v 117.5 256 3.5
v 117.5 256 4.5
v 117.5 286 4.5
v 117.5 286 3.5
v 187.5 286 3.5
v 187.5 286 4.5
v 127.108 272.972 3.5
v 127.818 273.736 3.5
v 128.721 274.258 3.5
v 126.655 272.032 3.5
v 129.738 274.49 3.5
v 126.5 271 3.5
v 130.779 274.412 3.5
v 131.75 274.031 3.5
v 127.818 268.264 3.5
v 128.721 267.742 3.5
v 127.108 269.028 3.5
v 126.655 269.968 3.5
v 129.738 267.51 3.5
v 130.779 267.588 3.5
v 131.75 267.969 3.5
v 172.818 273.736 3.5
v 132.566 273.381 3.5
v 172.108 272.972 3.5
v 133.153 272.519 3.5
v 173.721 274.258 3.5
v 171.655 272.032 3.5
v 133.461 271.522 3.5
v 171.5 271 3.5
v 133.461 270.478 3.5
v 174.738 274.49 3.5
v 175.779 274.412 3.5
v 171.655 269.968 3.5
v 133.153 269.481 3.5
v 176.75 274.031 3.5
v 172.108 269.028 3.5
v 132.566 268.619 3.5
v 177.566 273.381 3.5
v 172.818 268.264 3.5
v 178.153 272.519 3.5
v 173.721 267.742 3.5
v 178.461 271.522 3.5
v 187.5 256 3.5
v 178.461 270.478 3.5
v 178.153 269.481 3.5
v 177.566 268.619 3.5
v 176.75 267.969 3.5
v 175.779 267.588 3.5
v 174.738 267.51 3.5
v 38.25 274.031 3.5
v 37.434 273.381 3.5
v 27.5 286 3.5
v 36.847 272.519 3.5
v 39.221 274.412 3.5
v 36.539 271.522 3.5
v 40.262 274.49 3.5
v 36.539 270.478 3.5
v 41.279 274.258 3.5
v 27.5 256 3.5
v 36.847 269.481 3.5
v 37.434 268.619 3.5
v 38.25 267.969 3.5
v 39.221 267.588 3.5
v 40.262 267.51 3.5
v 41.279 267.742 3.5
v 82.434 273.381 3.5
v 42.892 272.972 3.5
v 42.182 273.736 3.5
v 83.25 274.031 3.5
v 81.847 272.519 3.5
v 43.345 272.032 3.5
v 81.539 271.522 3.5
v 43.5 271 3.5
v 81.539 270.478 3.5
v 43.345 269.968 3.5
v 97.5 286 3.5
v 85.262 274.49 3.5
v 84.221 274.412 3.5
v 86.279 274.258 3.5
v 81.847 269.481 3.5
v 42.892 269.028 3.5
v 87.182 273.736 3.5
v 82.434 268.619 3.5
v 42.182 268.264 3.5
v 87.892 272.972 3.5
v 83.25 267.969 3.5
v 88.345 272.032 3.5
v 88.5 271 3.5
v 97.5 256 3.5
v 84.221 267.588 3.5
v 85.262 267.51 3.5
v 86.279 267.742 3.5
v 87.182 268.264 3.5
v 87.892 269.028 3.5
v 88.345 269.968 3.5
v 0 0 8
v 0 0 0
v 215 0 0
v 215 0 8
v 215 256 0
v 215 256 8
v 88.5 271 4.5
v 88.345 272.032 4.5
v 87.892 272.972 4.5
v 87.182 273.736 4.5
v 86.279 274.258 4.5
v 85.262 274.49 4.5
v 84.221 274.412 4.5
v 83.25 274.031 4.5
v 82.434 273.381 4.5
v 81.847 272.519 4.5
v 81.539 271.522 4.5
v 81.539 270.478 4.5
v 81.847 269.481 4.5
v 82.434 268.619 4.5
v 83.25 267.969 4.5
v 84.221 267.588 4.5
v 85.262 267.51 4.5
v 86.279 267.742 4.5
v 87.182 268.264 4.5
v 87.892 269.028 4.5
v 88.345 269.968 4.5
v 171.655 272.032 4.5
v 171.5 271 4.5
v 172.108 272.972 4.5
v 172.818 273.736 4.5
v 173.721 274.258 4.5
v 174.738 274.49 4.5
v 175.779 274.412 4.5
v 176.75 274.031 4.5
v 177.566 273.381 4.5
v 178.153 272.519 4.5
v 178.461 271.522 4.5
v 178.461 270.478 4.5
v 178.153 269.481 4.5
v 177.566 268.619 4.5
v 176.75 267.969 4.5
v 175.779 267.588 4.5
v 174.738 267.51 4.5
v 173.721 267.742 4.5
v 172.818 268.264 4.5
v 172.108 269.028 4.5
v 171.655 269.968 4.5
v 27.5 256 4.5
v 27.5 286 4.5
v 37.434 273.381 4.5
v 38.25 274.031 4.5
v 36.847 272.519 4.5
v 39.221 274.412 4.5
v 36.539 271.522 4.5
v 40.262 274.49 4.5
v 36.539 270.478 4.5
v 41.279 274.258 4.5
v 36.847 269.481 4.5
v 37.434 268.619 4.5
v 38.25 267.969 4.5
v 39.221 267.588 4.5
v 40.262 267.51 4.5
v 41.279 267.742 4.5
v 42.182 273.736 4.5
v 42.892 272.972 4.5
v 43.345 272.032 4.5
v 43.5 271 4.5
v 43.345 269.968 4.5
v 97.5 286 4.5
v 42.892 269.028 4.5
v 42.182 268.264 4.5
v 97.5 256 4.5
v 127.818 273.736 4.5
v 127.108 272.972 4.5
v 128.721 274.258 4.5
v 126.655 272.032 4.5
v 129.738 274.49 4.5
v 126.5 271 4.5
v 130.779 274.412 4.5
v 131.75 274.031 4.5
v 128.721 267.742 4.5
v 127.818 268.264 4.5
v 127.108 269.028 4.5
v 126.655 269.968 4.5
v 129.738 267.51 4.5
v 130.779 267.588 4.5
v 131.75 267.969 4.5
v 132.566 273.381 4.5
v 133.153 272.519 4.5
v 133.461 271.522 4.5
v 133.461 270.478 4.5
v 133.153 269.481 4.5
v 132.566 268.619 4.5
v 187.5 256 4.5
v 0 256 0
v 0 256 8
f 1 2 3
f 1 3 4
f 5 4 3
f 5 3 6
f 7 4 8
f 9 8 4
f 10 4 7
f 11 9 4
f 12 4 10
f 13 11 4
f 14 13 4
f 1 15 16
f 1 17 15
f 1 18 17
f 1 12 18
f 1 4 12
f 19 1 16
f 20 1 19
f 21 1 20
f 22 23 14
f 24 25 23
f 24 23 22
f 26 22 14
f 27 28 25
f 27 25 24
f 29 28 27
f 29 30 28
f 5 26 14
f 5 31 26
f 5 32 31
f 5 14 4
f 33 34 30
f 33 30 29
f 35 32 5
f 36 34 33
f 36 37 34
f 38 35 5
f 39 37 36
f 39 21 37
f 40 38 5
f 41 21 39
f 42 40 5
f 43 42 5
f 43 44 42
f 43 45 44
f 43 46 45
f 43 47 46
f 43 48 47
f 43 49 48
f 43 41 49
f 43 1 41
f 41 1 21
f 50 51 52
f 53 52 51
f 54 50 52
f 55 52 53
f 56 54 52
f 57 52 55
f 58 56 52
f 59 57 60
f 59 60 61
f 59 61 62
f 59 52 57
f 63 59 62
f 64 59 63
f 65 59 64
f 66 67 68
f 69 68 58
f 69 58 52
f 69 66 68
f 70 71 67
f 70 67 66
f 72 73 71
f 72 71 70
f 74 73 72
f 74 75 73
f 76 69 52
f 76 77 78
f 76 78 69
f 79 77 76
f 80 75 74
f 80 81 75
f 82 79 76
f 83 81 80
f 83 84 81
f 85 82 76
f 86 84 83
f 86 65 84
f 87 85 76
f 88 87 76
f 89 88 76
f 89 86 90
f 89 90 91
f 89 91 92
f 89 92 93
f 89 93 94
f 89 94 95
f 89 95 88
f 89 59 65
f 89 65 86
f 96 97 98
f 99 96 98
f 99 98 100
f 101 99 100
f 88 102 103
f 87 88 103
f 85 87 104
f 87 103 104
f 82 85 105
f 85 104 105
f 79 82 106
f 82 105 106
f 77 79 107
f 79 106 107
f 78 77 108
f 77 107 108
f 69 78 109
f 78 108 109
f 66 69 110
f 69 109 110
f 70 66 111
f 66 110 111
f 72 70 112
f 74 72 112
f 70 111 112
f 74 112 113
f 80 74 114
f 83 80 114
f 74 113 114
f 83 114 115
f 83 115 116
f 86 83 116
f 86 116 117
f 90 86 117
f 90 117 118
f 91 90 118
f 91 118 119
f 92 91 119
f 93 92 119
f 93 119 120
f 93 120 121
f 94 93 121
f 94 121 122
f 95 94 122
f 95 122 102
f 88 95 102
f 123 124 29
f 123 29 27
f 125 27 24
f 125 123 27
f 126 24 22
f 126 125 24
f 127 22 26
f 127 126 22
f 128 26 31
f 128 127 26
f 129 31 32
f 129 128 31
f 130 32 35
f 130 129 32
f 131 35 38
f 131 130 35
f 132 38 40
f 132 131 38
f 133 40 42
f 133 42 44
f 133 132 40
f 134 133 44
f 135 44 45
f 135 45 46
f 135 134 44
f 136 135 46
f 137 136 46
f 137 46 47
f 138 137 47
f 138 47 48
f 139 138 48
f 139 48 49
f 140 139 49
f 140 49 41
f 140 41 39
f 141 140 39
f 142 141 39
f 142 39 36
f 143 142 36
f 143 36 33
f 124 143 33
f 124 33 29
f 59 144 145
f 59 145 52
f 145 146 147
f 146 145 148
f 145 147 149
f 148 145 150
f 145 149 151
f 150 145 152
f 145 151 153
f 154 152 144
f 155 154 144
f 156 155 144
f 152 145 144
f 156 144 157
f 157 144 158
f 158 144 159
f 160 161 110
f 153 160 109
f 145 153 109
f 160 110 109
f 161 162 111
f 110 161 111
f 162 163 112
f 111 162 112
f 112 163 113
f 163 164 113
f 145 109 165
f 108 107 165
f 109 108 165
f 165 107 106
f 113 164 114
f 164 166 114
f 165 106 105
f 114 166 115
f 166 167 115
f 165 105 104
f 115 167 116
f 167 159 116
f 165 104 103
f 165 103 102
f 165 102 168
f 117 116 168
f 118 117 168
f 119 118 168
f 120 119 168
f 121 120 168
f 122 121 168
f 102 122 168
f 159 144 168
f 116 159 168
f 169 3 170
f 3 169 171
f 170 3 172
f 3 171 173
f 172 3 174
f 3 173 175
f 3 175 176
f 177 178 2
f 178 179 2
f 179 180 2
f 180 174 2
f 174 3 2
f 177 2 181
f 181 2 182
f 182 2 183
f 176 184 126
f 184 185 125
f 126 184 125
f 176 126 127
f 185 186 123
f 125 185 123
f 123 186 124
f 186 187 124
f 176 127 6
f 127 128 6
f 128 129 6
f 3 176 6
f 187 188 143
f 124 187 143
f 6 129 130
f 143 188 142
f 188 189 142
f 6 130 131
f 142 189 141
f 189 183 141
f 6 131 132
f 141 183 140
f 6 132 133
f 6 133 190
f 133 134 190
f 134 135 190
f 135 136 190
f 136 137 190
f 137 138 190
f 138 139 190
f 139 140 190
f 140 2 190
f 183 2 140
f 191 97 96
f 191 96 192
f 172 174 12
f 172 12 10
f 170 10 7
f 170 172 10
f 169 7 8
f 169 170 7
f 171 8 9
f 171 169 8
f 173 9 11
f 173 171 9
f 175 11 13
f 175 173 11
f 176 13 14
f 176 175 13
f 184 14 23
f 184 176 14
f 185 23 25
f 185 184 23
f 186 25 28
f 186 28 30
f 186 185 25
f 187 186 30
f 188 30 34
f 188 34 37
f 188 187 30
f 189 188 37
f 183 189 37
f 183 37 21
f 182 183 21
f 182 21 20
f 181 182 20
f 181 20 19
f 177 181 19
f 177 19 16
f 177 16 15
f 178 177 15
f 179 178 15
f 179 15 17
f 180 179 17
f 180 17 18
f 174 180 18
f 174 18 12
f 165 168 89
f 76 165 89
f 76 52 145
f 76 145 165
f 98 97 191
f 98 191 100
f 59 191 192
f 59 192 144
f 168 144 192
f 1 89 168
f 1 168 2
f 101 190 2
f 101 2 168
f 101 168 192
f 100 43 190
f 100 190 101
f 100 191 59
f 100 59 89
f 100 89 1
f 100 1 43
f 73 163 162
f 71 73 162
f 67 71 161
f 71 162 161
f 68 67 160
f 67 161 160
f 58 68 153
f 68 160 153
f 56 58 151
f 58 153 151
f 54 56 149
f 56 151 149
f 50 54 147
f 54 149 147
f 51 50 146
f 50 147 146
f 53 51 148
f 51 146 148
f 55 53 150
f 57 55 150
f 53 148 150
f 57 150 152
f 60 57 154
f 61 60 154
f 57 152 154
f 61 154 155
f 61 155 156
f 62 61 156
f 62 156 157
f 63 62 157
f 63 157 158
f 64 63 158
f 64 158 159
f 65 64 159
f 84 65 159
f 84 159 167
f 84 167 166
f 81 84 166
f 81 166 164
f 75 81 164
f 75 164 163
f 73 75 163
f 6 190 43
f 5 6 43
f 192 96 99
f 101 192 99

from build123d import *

# Parameters (mm, degrees)
SKETCH2_W           = 215
SKETCH2_H           = 256
BOSS_EXTRUDE1_DEPTH = 8
SKETCH3_W           = 70
SKETCH3_H           = 1
BOSS_EXTRUDE3_DEPTH = 30
CUT_EXTRUDE1_REACH  = 359.829
SKETCH5_R           = 3.5


with BuildPart() as part:
    # Sketch2 → Boss-Extrude1 (new body)
    with BuildSketch(Plane.XY):
        with Locations((107.5, 128)):
            Rectangle(SKETCH2_W, SKETCH2_H)
    extrude(amount=BOSS_EXTRUDE1_DEPTH)

    # Sketch3 → Boss-Extrude3 (add)
    with BuildSketch(Plane(origin=(0, 256, 0), x_dir=(1, 0, 0), z_dir=(0, 1, 0))):
        with Locations((62.5, -4)):
            Rectangle(SKETCH3_W, SKETCH3_H)
        with Locations((152.5, -4)):
            Rectangle(SKETCH3_W, SKETCH3_H)
    extrude(amount=BOSS_EXTRUDE3_DEPTH)

    # Sketch5 → Cut-Extrude1 (cut, up to next)
    with BuildSketch(Plane.XY.offset(4.5), mode=Mode.PRIVATE) as cut_extrude1_sk1:
        with Locations((40, 271)):
            Circle(SKETCH5_R)
    cut_extrude1_tool1 = extrude(cut_extrude1_sk1.sketch, amount=-CUT_EXTRUDE1_REACH, mode=Mode.PRIVATE) & part.part
    # Sketch5 → Cut-Extrude1 (cut, up to next)
    with BuildSketch(Plane.XY.offset(4.5), mode=Mode.PRIVATE) as cut_extrude1_sk2:
        with Locations((85, 271)):
            Circle(SKETCH5_R)
    cut_extrude1_tool2 = extrude(cut_extrude1_sk2.sketch, amount=-CUT_EXTRUDE1_REACH, mode=Mode.PRIVATE) & part.part
    cut_extrude1_1 = cut_extrude1_tool1.solids().sort_by_distance((40, 271, 4.5))[0]
    add(cut_extrude1_1, mode=Mode.SUBTRACT)
    cut_extrude1_2 = cut_extrude1_tool2.solids().sort_by_distance((85, 271, 4.5))[0]
    add(cut_extrude1_2, mode=Mode.SUBTRACT)
    cut_extrude1 = cut_extrude1_1 + cut_extrude1_2  # Cut-Extrude1 as one shape, for the pattern or mirror that repeats it

    # Mirror1: Cut-Extrude1 across plane
    add(cut_extrude1.mirror(Plane(origin=(107.5, 0, 0), x_dir=(0, 0, 1), z_dir=(1, 0, 0))), mode=Mode.SUBTRACT)


solid = part.part
